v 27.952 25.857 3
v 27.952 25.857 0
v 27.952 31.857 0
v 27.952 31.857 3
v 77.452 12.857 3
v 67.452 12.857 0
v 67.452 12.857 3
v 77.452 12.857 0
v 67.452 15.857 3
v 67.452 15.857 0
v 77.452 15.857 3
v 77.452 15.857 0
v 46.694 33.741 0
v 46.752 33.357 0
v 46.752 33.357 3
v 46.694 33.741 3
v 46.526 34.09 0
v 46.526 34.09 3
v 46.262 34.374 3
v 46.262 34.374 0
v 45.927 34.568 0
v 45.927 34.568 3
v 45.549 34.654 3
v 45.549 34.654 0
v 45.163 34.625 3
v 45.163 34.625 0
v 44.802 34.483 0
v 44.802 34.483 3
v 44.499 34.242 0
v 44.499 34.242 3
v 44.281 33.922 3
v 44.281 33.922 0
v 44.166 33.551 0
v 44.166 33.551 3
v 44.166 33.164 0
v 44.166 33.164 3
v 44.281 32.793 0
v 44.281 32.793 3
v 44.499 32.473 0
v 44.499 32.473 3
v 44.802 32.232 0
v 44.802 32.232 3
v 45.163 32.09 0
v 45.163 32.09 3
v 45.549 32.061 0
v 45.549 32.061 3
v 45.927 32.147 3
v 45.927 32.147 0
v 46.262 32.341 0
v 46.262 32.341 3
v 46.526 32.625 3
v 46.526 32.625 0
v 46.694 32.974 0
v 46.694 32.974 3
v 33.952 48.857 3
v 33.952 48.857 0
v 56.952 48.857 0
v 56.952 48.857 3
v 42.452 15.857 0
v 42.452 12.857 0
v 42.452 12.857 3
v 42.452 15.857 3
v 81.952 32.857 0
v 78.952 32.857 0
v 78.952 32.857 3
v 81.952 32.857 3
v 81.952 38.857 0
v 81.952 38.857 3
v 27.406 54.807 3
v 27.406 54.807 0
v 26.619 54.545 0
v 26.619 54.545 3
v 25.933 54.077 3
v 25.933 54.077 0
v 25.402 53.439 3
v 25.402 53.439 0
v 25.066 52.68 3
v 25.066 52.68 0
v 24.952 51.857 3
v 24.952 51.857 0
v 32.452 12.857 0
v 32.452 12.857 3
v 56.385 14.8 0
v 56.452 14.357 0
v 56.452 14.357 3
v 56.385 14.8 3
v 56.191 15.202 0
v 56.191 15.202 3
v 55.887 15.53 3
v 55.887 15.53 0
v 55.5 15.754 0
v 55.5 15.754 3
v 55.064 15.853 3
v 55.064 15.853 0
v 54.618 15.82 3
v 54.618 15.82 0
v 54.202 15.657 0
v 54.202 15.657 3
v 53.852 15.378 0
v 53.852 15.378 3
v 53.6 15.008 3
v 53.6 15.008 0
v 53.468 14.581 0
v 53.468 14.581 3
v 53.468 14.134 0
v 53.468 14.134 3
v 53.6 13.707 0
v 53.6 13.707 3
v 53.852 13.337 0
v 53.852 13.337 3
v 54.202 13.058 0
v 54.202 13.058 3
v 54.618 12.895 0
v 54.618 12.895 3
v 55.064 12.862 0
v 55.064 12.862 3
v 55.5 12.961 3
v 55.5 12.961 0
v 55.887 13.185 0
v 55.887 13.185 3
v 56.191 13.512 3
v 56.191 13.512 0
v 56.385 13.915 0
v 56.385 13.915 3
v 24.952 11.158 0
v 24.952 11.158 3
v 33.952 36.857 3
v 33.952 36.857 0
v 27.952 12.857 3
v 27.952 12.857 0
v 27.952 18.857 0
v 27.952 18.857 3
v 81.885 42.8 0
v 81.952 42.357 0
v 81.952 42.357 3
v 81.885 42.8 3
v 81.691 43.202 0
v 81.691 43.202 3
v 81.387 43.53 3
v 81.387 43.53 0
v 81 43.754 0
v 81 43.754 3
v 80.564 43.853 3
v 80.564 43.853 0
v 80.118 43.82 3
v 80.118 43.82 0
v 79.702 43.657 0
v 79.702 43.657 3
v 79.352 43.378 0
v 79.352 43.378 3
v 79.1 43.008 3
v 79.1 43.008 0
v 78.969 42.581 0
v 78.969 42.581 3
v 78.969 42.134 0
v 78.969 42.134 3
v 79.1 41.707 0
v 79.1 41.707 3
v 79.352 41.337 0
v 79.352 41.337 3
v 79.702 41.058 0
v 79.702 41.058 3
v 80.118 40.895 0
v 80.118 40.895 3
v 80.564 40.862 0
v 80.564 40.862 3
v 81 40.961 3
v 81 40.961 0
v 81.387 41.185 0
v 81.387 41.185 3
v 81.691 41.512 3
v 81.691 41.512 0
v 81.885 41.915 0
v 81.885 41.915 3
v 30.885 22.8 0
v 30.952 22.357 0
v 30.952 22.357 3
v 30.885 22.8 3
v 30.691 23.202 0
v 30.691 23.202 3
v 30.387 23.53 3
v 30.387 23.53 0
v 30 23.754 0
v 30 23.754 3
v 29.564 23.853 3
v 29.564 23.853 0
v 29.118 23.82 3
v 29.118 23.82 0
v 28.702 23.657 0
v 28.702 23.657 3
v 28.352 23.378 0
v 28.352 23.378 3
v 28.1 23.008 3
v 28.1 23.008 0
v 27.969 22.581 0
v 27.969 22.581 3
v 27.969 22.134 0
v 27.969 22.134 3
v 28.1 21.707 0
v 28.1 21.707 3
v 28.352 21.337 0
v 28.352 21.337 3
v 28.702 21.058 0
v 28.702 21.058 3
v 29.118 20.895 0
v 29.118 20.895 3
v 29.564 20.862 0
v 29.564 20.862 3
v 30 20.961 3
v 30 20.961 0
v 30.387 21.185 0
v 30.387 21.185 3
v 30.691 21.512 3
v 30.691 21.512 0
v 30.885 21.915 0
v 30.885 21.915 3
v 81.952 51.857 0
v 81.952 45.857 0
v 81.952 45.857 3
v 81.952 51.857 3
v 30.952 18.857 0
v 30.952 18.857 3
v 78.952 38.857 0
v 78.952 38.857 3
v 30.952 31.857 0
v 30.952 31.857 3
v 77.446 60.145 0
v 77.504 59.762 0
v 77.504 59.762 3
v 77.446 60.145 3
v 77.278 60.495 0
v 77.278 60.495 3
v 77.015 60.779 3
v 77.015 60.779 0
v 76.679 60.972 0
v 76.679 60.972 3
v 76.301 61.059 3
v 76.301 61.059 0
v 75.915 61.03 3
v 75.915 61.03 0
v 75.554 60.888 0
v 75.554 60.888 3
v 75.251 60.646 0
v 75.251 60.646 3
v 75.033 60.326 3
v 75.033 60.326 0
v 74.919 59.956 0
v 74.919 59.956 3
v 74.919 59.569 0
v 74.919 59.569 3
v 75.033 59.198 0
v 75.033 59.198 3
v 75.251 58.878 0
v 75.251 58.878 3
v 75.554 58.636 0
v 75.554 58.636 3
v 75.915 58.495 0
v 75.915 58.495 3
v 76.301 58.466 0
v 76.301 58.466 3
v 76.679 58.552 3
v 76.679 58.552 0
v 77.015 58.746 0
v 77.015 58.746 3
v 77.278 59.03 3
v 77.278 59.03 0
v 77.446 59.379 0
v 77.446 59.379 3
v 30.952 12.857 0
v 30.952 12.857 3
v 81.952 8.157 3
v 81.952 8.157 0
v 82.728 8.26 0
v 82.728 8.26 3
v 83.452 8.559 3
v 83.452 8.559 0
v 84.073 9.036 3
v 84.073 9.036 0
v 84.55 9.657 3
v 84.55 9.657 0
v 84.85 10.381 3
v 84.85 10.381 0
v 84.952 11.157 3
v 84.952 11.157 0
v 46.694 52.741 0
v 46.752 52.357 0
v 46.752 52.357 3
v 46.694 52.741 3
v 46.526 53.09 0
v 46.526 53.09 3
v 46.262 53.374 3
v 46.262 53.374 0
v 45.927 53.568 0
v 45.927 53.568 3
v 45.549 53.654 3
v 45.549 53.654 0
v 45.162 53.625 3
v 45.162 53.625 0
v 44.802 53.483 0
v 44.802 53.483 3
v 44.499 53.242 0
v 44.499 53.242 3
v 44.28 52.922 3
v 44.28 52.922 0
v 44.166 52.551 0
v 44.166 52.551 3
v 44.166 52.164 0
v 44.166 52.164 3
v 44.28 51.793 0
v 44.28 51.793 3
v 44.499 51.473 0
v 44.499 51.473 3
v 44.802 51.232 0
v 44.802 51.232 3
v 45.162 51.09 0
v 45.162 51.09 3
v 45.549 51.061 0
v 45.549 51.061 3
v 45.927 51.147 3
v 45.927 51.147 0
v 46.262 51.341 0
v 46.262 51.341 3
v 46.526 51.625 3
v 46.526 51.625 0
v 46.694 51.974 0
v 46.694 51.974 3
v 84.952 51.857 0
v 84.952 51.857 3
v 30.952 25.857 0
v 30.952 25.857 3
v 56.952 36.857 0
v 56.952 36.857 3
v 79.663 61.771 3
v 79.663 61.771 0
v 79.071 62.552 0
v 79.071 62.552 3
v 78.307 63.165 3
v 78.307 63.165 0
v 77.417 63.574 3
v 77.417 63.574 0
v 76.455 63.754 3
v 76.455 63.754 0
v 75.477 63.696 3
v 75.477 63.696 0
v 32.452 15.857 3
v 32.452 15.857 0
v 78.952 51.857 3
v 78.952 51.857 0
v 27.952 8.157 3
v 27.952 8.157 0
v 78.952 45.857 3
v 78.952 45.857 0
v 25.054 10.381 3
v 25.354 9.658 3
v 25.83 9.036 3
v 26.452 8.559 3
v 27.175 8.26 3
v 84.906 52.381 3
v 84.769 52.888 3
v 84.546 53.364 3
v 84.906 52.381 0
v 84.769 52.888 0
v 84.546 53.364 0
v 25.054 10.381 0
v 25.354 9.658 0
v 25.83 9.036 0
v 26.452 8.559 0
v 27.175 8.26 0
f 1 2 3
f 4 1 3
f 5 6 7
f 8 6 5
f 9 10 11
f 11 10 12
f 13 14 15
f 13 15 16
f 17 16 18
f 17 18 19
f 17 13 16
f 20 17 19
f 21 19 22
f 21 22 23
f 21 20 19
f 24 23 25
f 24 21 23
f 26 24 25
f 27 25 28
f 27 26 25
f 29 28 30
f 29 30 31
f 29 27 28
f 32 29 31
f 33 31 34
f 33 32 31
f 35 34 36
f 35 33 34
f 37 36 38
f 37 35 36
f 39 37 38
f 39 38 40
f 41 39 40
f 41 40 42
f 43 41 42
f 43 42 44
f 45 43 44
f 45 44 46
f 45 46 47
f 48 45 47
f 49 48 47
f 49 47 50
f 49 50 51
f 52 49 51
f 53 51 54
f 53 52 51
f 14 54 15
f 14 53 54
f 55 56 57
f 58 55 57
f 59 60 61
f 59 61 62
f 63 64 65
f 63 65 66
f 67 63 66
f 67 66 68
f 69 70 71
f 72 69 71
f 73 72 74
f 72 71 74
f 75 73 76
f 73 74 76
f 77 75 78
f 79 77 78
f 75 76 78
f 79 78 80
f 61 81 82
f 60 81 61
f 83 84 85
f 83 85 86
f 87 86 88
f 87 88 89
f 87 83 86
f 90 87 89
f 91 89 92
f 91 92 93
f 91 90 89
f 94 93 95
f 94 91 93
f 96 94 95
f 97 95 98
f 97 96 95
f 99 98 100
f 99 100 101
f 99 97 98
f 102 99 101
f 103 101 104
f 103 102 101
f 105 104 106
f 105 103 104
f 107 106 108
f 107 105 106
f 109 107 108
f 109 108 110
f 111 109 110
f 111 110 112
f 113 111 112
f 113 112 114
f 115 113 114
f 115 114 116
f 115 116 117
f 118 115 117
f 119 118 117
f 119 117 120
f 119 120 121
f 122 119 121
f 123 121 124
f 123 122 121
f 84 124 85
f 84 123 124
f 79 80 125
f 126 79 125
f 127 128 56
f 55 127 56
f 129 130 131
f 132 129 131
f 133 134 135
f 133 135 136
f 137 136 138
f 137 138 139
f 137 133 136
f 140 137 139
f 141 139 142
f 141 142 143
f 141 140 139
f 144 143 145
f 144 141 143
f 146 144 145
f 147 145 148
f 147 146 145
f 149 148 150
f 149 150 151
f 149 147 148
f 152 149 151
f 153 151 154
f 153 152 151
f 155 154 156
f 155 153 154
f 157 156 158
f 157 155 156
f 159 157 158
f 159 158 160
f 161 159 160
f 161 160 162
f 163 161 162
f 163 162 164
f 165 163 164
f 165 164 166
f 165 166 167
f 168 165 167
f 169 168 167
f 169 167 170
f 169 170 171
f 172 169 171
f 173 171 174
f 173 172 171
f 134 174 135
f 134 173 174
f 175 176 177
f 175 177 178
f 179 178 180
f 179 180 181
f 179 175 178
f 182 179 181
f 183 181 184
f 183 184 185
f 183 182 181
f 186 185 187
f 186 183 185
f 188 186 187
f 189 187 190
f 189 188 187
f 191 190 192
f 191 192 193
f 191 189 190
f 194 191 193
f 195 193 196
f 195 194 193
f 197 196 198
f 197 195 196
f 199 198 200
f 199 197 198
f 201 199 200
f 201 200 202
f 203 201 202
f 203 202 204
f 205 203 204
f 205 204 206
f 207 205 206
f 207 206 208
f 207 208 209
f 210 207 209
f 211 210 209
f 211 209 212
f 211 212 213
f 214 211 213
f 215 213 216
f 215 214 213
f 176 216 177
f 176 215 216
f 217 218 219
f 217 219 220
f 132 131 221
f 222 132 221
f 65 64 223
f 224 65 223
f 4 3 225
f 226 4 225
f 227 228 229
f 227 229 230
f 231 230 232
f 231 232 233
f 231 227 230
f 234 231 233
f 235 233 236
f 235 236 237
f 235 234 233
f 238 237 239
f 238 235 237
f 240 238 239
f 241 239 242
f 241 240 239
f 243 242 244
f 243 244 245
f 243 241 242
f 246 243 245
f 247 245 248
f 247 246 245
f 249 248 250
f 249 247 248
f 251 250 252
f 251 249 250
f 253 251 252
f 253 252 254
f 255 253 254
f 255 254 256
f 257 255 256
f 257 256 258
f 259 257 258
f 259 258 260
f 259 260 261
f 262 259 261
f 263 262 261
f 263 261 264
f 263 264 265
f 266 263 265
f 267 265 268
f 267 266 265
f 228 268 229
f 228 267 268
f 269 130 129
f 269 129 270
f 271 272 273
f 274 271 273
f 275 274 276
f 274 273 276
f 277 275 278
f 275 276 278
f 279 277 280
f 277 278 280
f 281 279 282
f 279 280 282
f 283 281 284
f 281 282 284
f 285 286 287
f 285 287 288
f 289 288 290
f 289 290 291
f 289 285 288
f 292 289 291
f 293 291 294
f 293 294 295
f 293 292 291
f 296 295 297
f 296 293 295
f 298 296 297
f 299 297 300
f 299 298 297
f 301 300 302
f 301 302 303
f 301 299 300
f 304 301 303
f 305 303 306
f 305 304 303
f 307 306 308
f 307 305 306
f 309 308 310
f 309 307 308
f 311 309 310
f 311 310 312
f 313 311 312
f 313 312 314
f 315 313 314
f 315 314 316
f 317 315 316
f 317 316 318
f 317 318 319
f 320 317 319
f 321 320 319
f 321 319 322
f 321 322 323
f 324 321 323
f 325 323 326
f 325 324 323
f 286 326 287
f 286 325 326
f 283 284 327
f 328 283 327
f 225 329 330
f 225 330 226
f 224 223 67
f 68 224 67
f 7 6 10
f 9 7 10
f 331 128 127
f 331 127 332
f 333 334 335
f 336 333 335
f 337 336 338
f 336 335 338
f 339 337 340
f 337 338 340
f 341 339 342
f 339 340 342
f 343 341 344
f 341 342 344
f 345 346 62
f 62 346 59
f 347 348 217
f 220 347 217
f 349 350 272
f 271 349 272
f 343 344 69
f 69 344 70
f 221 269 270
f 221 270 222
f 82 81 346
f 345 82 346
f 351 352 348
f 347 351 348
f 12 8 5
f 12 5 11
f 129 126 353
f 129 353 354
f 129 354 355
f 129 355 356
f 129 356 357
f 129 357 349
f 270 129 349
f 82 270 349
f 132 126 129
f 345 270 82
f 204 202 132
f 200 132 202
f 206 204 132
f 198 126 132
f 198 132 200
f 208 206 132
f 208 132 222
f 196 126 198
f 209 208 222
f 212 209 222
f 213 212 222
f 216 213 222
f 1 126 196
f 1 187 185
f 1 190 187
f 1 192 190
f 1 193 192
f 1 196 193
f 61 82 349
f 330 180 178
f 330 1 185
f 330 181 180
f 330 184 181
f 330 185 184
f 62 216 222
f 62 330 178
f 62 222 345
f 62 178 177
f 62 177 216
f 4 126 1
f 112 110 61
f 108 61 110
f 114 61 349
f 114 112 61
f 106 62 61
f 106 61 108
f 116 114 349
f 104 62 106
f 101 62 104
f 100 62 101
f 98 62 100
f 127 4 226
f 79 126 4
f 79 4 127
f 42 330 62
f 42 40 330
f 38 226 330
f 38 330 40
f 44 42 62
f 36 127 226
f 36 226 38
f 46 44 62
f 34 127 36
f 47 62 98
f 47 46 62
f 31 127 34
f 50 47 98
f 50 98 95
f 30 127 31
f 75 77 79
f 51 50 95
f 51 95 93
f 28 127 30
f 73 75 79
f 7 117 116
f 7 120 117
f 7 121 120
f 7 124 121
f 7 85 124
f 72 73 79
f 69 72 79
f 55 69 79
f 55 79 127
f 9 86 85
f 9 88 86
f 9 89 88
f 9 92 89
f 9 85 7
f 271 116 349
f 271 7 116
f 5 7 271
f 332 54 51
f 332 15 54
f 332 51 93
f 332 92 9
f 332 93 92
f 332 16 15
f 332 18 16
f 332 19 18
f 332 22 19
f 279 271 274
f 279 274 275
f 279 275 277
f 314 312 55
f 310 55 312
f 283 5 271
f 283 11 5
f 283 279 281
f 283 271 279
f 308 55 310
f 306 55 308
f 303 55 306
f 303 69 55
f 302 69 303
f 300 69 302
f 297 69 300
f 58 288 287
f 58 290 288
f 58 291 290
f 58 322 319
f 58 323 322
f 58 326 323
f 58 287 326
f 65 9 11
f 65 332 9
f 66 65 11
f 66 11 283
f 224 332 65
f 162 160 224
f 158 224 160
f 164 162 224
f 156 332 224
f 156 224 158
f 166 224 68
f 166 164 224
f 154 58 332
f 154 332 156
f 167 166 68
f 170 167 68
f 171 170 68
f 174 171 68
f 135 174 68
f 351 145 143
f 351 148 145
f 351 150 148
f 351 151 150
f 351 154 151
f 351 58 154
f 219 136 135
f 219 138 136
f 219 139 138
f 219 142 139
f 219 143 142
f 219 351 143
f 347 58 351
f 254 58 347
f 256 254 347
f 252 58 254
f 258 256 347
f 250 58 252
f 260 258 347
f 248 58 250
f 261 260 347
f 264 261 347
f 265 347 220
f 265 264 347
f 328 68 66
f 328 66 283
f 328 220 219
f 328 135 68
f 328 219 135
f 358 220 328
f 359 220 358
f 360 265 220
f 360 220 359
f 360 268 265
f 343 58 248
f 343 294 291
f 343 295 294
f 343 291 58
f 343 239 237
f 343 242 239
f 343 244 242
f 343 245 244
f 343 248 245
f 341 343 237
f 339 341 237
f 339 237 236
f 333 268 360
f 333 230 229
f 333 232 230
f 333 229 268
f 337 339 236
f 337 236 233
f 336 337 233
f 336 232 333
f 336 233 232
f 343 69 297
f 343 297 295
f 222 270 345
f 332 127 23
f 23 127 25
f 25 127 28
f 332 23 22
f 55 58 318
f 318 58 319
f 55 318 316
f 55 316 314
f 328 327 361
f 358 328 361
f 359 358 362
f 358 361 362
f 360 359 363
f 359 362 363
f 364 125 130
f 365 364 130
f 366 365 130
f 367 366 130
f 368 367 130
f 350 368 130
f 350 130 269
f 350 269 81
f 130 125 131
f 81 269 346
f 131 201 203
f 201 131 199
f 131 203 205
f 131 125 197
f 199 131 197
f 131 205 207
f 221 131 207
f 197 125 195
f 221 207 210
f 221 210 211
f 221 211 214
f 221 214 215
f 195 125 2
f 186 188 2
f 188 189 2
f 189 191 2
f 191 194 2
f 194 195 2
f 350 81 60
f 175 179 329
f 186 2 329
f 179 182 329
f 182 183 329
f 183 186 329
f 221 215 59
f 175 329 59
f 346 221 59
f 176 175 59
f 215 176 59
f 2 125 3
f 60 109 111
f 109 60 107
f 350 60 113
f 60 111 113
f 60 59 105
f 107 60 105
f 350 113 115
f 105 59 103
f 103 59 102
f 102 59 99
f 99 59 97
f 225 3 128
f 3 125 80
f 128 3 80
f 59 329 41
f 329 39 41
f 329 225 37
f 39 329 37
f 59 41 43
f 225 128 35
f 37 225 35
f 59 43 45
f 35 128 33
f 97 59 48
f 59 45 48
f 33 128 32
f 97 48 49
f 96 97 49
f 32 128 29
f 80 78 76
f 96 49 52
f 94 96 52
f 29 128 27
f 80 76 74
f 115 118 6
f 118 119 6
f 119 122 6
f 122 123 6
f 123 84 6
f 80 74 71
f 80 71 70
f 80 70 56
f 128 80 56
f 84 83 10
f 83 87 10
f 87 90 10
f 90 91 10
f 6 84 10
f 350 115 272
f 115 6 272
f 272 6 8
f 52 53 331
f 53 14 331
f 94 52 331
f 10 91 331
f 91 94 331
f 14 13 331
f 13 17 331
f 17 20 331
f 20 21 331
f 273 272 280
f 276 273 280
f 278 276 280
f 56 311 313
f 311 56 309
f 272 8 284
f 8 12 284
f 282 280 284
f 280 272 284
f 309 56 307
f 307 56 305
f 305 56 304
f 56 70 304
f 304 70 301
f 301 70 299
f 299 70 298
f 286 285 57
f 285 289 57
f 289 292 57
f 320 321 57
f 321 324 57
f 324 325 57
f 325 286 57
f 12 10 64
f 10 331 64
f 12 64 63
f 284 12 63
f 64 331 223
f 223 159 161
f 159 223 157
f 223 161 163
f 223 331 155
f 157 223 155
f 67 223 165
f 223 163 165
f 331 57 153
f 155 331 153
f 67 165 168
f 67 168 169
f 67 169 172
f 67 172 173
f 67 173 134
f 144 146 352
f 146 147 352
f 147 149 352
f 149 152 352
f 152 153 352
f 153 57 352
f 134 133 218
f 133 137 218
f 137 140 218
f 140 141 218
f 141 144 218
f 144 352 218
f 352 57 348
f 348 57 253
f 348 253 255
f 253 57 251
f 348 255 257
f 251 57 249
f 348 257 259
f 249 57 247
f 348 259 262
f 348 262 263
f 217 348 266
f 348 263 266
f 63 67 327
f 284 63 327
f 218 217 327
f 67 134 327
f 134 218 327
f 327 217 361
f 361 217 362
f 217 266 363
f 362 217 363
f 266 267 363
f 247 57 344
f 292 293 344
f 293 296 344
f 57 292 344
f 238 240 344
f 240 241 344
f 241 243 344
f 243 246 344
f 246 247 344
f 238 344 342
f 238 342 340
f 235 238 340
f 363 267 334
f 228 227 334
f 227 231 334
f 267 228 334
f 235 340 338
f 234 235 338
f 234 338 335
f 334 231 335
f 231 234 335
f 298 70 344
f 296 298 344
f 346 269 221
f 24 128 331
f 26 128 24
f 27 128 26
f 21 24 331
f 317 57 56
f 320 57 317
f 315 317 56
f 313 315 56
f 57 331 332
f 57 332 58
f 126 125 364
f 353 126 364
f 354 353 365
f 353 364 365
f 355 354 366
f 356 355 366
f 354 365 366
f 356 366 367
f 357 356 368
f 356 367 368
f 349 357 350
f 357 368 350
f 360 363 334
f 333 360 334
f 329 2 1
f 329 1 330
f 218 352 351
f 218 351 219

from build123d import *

# Parameters (mm, degrees)
MODEL_R             = 1.300000008
MODEL_R_2           = 1.3
MODEL_R_3           = 1.500000002
MODEL_W             = 3
MODEL_H             = 6
MODEL_W_2           = 23
MODEL_H_2           = 12
MODEL_W_3           = 10
MODEL_H_3           = 3
BOSS_EXTRUDE1_DEPTH = 3


with BuildPart() as part:
    # Model → Boss-Extrude1 (new body)
    with BuildSketch(Plane.XY):
        with BuildLine():
            Line((24.95163, 51.857462577), (24.95163, 11.157702759))
            ThreePointArc((24.95163, 11.157702759), (25.830365801, 9.036226784), (27.95183001, 8.157462577))
            Line((27.95183001, 8.157462577), (81.95183001, 8.157462577))
            ThreePointArc((81.95183001, 8.157462577), (84.0730792, 9.036166136), (84.951725641, 11.157438987))
            Line((84.951725641, 11.157438987), (84.95183, 51.857462577))
            ThreePointArc((84.95183, 51.857462577), (84.848554916, 52.637712888), (84.54593, 53.364262577))
            Line((84.54593, 53.364262577), (79.66303, 61.771262577))
            ThreePointArc((79.66303, 61.771262577), (77.874800295, 63.39663974), (75.47683, 63.695562577))
            Line((75.47683, 63.695562577), (27.40633, 54.807462577))
            ThreePointArc((27.40633, 54.807462577), (25.64557658, 53.776308467), (24.95163, 51.857462577))
        make_face()
        with Locations((45.451629992, 52.357462585)):
            Circle(MODEL_R, mode=Mode.SUBTRACT)
        with Locations((45.451829992, 33.357462569)):
            Circle(MODEL_R, mode=Mode.SUBTRACT)
        with Locations((76.20413, 59.762262577)):
            Circle(MODEL_R_2, mode=Mode.SUBTRACT)
        with Locations((54.951729998, 14.357462579)):
            Circle(MODEL_R_3, mode=Mode.SUBTRACT)
        with Locations((29.451829998, 22.357462575)):
            Circle(MODEL_R_3, mode=Mode.SUBTRACT)
        with Locations((80.451829998, 42.357462575)):
            Circle(MODEL_R_3, mode=Mode.SUBTRACT)
        with Locations((29.45183, 28.857462577)):
            Rectangle(MODEL_W, MODEL_H, mode=Mode.SUBTRACT)
        with Locations((45.45183, 42.857462577)):
            Rectangle(MODEL_W_2, MODEL_H_2, mode=Mode.SUBTRACT)
        with Locations((29.45183, 15.857462577)):
            Rectangle(MODEL_W, MODEL_H, mode=Mode.SUBTRACT)
        with Locations((37.45183, 14.357462577)):
            Rectangle(MODEL_W_3, MODEL_H_3, mode=Mode.SUBTRACT)
        with Locations((72.45183, 14.357462577)):
            Rectangle(MODEL_W_3, MODEL_H_3, mode=Mode.SUBTRACT)
        with Locations((80.45183, 35.857462577)):
            Rectangle(MODEL_W, MODEL_H, mode=Mode.SUBTRACT)
        with Locations((80.45183, 48.857462577)):
            Rectangle(MODEL_W, MODEL_H, mode=Mode.SUBTRACT)
    extrude(amount=BOSS_EXTRUDE1_DEPTH)


solid = part.part
